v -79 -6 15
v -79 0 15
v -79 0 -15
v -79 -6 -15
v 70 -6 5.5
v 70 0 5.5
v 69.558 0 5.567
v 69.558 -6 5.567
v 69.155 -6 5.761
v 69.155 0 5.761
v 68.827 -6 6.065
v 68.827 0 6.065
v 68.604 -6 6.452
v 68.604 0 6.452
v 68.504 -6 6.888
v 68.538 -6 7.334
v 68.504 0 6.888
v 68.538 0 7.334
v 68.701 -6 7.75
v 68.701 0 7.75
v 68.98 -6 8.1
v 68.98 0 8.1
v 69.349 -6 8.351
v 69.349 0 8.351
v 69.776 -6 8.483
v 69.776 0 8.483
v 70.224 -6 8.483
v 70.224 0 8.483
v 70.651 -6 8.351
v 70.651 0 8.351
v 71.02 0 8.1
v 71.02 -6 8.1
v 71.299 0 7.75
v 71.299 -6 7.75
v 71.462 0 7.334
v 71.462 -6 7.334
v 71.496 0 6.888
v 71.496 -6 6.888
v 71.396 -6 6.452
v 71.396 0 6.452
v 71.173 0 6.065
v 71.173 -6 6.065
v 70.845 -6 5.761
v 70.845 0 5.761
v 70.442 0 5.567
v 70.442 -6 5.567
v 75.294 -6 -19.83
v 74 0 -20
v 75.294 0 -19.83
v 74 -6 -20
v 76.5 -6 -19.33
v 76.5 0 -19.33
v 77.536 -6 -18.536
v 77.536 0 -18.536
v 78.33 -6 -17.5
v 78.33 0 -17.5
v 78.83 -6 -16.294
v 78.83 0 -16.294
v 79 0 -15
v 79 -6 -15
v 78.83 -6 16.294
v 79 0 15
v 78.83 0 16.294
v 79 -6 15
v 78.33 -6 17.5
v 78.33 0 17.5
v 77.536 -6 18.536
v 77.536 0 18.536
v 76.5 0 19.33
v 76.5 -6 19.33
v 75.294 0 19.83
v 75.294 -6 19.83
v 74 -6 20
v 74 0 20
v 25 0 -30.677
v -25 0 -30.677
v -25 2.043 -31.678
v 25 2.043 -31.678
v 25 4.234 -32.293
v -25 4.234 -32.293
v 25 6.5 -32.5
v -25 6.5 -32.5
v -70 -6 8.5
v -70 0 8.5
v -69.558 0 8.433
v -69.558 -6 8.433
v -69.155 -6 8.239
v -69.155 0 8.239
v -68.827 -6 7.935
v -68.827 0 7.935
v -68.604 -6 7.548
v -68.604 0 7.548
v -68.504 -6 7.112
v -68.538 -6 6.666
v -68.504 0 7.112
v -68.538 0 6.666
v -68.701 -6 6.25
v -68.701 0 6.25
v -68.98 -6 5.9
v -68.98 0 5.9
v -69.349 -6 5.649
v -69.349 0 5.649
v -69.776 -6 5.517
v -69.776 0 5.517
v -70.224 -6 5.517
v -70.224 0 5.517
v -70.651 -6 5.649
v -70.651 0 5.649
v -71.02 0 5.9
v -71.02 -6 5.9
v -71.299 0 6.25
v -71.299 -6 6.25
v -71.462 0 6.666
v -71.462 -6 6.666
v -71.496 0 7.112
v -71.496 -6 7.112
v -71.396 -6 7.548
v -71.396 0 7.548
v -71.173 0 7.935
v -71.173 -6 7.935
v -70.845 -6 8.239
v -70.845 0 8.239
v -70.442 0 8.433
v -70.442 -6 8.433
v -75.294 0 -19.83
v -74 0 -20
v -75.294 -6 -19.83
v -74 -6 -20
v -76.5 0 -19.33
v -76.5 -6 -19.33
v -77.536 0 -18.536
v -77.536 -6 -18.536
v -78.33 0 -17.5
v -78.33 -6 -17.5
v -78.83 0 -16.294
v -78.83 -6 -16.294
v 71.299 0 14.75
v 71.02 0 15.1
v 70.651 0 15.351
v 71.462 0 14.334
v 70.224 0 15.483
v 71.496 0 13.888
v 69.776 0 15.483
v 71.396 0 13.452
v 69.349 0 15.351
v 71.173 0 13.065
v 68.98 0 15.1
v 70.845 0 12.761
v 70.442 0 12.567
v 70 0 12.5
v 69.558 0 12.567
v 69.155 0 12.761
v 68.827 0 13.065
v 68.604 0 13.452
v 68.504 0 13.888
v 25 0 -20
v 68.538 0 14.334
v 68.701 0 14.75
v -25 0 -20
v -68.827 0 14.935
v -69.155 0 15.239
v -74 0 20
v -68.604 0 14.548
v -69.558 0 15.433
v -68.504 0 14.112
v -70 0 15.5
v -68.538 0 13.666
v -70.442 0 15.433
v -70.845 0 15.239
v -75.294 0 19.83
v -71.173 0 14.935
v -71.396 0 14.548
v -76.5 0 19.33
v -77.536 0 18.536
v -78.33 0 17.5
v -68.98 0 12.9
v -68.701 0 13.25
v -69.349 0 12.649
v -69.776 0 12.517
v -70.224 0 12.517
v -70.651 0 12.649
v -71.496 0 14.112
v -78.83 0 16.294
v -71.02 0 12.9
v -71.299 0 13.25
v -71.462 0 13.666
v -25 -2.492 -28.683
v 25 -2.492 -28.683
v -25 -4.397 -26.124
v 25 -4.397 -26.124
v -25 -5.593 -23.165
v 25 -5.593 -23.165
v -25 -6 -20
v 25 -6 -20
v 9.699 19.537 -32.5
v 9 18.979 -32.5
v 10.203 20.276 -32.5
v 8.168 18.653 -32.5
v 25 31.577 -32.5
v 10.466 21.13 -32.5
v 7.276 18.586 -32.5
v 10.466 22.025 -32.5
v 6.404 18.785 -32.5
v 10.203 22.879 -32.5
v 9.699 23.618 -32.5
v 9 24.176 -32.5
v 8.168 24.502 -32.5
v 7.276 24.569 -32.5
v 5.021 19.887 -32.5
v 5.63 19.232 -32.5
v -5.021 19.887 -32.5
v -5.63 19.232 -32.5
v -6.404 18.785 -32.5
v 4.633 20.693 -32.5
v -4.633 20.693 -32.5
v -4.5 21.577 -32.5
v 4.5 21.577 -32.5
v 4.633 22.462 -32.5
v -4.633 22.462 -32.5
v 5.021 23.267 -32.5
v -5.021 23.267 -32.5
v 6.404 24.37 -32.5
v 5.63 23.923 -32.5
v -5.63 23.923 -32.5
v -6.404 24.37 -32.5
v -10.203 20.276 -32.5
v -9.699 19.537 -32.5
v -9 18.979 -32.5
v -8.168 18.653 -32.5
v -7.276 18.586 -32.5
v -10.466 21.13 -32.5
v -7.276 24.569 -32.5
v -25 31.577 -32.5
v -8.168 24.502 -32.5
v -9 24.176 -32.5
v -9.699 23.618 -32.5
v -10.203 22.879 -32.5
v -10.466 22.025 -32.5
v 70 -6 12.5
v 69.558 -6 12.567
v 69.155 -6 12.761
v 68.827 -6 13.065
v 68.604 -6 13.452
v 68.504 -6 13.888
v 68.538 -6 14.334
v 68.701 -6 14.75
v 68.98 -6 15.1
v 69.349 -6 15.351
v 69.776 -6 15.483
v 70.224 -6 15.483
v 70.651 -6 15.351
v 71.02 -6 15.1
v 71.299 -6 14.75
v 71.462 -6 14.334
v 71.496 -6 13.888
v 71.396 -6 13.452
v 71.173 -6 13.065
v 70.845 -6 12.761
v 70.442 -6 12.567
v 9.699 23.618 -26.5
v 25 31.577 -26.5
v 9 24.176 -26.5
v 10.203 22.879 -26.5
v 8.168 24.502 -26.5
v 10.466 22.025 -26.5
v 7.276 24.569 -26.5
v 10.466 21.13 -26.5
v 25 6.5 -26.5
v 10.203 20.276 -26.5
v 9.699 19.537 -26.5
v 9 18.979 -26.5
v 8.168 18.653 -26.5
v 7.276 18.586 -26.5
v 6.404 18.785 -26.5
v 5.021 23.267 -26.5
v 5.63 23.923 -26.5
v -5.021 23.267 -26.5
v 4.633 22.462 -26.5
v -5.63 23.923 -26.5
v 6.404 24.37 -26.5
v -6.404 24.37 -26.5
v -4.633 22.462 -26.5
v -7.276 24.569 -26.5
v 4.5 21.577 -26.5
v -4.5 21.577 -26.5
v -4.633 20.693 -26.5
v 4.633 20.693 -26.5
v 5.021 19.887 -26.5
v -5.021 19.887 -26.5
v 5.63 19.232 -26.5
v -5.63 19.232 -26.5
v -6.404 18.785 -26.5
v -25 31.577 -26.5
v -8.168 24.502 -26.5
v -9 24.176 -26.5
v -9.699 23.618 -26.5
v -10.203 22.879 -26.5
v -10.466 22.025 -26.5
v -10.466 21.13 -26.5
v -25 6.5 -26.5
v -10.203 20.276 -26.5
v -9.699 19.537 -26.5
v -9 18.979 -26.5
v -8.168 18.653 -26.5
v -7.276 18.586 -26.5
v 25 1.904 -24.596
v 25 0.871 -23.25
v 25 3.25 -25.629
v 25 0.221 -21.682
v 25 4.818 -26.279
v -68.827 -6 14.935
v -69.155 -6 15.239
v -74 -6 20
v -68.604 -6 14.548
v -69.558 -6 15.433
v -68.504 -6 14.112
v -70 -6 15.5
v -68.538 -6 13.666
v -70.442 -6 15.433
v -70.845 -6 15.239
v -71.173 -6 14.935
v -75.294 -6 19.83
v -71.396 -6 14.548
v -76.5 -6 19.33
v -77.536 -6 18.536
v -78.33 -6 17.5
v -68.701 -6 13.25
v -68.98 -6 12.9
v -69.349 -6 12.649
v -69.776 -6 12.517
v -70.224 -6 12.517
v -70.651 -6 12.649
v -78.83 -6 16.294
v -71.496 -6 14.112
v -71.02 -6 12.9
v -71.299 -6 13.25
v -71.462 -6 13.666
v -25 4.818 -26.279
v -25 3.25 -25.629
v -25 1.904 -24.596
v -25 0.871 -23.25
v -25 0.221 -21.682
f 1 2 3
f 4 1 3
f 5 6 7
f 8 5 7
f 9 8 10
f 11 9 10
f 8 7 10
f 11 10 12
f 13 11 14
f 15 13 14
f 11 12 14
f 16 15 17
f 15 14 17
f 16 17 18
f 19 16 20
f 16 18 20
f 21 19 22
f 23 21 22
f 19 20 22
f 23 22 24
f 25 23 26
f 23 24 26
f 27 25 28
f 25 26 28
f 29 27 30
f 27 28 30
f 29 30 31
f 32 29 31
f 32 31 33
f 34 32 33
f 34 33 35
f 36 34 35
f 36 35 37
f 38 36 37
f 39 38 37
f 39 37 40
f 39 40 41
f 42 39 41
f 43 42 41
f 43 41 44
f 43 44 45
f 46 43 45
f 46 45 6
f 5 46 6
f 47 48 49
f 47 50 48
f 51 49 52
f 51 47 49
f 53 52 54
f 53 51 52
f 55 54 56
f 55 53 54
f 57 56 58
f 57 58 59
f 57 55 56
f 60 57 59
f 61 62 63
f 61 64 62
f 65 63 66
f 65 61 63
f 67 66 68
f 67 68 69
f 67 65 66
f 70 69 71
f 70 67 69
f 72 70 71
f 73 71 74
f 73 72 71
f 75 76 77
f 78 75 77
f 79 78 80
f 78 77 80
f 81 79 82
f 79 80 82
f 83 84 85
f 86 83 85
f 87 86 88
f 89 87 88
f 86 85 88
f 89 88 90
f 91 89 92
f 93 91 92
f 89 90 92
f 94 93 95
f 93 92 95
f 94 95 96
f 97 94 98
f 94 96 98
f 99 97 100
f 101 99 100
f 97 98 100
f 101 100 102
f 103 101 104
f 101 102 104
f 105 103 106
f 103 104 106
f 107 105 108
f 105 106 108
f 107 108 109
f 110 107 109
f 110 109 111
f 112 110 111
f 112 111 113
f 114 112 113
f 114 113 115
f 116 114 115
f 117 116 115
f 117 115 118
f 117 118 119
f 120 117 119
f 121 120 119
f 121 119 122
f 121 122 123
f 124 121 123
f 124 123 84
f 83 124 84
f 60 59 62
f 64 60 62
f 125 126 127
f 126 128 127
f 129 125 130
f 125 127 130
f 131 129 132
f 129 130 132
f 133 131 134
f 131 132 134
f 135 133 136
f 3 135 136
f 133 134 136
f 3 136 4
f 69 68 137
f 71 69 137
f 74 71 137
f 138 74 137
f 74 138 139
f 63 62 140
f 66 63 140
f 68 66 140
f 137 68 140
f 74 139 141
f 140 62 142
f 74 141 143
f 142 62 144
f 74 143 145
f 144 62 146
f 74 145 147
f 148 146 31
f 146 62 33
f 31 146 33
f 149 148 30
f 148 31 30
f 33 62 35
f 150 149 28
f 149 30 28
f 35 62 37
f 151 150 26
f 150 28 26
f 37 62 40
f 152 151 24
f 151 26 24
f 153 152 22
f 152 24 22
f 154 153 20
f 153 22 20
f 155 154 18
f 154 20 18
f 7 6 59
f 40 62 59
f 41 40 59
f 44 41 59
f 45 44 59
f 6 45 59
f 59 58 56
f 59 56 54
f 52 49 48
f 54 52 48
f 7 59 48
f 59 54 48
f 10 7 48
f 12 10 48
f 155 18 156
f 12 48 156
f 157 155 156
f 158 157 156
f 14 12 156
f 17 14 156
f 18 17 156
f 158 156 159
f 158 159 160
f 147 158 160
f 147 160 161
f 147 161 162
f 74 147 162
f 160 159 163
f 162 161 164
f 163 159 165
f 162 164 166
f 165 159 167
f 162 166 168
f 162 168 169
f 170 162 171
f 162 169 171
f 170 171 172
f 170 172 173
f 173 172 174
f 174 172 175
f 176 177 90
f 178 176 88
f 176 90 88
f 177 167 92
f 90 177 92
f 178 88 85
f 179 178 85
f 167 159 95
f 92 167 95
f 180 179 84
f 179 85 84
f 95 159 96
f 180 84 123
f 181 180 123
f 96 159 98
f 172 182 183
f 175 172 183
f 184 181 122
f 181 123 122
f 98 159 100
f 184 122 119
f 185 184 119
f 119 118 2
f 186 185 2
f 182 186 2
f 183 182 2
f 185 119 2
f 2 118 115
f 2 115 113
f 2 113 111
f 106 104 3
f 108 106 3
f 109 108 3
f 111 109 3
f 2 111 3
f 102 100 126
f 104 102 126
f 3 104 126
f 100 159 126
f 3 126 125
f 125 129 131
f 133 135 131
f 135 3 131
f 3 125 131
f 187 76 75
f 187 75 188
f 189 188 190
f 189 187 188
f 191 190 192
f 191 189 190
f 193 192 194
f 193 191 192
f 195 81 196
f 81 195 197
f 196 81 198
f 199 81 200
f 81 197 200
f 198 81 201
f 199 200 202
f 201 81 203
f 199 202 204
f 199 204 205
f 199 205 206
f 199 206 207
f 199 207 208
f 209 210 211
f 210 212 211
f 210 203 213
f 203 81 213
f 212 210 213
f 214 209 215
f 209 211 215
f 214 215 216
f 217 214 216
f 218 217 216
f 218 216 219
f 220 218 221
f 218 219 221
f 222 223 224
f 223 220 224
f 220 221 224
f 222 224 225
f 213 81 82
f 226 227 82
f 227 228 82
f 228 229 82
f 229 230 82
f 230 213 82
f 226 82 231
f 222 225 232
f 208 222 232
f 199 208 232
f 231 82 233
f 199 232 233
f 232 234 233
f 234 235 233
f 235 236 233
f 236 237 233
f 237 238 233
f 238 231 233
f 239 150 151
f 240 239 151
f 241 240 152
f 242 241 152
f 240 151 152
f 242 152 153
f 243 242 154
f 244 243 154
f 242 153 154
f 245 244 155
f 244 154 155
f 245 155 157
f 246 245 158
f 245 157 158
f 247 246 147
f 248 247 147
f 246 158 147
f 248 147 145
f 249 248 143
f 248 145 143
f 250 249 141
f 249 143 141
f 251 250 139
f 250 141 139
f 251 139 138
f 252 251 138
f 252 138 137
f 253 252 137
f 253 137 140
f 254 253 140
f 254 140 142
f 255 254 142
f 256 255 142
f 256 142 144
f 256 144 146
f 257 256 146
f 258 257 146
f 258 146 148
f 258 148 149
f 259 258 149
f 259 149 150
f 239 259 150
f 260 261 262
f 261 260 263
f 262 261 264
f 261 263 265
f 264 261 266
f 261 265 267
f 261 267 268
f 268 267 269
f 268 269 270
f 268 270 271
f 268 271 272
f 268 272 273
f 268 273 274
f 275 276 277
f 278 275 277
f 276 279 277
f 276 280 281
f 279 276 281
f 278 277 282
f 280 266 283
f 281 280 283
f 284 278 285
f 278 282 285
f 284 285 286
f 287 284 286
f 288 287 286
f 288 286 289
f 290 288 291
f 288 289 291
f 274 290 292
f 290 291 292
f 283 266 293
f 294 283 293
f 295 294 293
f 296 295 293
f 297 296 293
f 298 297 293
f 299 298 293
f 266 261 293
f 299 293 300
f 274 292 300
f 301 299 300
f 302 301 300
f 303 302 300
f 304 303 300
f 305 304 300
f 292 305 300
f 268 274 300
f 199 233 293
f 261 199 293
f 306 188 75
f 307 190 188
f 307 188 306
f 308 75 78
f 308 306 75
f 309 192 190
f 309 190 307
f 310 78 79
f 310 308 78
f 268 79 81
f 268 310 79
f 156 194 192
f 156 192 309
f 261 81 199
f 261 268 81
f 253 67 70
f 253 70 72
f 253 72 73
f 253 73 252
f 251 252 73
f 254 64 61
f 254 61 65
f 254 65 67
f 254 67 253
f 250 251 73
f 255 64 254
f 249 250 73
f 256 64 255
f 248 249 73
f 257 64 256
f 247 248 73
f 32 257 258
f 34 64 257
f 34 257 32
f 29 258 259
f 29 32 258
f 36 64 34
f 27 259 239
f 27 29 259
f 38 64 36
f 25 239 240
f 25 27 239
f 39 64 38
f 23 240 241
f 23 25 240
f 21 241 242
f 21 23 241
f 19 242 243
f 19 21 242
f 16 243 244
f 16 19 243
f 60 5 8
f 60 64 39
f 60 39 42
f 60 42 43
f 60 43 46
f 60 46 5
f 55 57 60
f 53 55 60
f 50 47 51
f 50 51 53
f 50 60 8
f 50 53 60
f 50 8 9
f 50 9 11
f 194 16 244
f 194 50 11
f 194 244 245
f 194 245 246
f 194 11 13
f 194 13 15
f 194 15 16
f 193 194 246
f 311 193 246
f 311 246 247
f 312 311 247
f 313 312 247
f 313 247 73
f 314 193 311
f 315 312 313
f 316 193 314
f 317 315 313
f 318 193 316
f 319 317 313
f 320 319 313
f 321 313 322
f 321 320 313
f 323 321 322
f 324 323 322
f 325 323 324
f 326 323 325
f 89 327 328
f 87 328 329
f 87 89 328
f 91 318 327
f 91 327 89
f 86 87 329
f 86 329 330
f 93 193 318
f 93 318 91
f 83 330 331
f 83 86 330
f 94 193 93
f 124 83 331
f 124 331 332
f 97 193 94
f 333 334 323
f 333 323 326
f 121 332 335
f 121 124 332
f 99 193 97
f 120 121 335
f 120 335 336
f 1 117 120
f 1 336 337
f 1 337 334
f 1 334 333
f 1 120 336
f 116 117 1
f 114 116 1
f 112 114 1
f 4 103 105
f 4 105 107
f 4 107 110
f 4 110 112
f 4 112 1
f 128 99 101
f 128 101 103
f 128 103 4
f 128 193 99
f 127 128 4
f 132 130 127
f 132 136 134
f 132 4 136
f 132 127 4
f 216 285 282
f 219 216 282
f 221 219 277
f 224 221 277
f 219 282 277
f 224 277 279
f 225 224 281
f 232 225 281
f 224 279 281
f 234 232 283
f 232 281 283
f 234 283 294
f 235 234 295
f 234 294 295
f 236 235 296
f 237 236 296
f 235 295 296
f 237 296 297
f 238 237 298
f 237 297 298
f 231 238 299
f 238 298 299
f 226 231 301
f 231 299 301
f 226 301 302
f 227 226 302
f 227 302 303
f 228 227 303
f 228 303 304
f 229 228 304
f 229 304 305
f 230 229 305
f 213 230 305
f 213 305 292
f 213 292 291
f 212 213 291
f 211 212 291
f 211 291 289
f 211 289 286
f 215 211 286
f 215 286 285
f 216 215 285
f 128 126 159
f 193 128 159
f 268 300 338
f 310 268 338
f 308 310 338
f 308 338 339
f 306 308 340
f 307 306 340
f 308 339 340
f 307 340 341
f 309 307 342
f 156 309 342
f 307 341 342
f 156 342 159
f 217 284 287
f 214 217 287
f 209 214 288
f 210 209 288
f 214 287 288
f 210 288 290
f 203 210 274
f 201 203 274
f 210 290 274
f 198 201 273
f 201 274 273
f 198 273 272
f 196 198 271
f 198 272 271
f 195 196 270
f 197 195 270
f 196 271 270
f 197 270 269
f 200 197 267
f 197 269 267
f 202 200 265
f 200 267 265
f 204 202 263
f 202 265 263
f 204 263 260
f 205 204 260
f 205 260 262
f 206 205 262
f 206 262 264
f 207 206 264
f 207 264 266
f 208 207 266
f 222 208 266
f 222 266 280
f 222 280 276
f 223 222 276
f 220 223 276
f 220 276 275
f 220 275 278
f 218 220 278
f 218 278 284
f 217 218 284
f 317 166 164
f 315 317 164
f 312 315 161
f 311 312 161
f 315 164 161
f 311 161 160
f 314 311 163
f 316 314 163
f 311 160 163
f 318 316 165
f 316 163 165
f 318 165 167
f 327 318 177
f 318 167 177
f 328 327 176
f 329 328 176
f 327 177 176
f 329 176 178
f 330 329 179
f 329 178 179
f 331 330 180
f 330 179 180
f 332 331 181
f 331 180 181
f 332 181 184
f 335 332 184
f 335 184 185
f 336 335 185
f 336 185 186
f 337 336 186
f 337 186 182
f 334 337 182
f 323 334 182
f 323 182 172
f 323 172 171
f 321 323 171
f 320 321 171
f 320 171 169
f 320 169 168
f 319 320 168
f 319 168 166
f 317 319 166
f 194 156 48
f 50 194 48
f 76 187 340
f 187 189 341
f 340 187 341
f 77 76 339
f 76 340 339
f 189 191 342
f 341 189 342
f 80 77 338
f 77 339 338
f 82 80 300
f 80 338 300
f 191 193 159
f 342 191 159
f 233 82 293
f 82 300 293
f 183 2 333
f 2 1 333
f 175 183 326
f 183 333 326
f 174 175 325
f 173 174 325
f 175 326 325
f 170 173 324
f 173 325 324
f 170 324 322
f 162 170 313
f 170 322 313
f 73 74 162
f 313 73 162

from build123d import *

# Parameters (mm, degrees)
BASE_FLANGE1_DEPTH     = 6
SKETCHED_START         = -25
SKETCHED_BEND1_DEPTH   = 50
SKETCHED_BEND1_2_DEPTH = 50
SKETCH7_R              = 1.5
CUT_EXTRUDE1_DEPTH     = 92.073510938
FILLET1_R              = 5
SKETCH8_R              = 3
CUT_EXTRUDE2_DEPTH     = 97.955579492


# Read off the part's stored shape, not the designer's step: Sketched Bend1
# Sheet-metal steps are written as plain solids
with BuildPart() as part:
    # Sketch1 → Base-Flange1 (new body)
    with BuildSketch(Plane(origin=(0, 0, 0), x_dir=(1, 0, 0), z_dir=(0, 1, 0))):
        Polygon((25, 20), (79, 20), (79, -20), (-79, -20), (-79, 20), (-25, 20), (-25, 60), (25, 60), align=None)
    extrude(amount=-BASE_FLANGE1_DEPTH)

    # Sketched Bend1 outline → Sketched Bend1 (cut)
    with BuildSketch(Plane.YZ.offset(SKETCHED_START)):
        with BuildLine():
            Line((0, -60), (0, -30.677078252))
            ThreePointArc((0, -30.677078252), (-4.397247359, -26.123724357), (-6, -20))
            Line((-6, -20), (-6, -60))
            Line((-6, -60), (0, -60))
        make_face()
    extrude(amount=SKETCHED_BEND1_DEPTH, mode=Mode.SUBTRACT)

    # Sketched Bend1 2 outline → Sketched Bend1 2 (add)
    with BuildSketch(Plane.YZ.offset(SKETCHED_START)):
        with BuildLine():
            Line((6.5, -32.5), (31.577434895, -32.5))
            Line((31.577434895, -32.5), (31.577434895, -26.5))
            Line((31.577434895, -26.5), (6.5, -26.5))
            ThreePointArc((6.5, -26.5), (1.903805922, -24.596194078), (0, -20))
            Line((0, -20), (0, -30.677078252))
            ThreePointArc((0, -30.677078252), (3.124609515, -32.035644523), (6.5, -32.5))
        make_face()
    extrude(amount=SKETCHED_BEND1_2_DEPTH)

    # Sketch7 → Cut-Extrude1 (cut, through all)
    with BuildSketch(Plane(origin=(0, 0, 0), x_dir=(1, 0, 0), z_dir=(0, 1, 0))):
        with Locations(Location((-70, -7, 0), (0, 0, 270))):
            Circle(SKETCH7_R)
        with Locations(Location((-70, -14, 0), (0, 0, 270))):
            Circle(SKETCH7_R)
        with Locations(Location((70, -14, 0), (0, 0, 90))):
            Circle(SKETCH7_R)
        with Locations(Location((70, -7, 0), (0, 0, 90))):
            Circle(SKETCH7_R)
    extrude(amount=-CUT_EXTRUDE1_DEPTH, mode=Mode.SUBTRACT)

    # Fillet1
    fillet1_edges = [part.edges().sort_by_distance(p)[0] for p in [
        (-79, -3, 20),
        (79, -3, 20),
        (79, -3, -20),
        (-79, -3, -20),
    ]]
    fillet(fillet1_edges, radius=FILLET1_R)

    # Sketch8 → Cut-Extrude2 (cut, through all)
    with BuildSketch(Plane.XY.offset(-26.5)):
        with Locations((-7.5, 21.577434895)):
            Circle(SKETCH8_R)
        with Locations(Location((7.5, 21.577434895, 0), (0, 0, 180))):
            Circle(SKETCH8_R)
    extrude(amount=-CUT_EXTRUDE2_DEPTH, mode=Mode.SUBTRACT)


solid = part.part
